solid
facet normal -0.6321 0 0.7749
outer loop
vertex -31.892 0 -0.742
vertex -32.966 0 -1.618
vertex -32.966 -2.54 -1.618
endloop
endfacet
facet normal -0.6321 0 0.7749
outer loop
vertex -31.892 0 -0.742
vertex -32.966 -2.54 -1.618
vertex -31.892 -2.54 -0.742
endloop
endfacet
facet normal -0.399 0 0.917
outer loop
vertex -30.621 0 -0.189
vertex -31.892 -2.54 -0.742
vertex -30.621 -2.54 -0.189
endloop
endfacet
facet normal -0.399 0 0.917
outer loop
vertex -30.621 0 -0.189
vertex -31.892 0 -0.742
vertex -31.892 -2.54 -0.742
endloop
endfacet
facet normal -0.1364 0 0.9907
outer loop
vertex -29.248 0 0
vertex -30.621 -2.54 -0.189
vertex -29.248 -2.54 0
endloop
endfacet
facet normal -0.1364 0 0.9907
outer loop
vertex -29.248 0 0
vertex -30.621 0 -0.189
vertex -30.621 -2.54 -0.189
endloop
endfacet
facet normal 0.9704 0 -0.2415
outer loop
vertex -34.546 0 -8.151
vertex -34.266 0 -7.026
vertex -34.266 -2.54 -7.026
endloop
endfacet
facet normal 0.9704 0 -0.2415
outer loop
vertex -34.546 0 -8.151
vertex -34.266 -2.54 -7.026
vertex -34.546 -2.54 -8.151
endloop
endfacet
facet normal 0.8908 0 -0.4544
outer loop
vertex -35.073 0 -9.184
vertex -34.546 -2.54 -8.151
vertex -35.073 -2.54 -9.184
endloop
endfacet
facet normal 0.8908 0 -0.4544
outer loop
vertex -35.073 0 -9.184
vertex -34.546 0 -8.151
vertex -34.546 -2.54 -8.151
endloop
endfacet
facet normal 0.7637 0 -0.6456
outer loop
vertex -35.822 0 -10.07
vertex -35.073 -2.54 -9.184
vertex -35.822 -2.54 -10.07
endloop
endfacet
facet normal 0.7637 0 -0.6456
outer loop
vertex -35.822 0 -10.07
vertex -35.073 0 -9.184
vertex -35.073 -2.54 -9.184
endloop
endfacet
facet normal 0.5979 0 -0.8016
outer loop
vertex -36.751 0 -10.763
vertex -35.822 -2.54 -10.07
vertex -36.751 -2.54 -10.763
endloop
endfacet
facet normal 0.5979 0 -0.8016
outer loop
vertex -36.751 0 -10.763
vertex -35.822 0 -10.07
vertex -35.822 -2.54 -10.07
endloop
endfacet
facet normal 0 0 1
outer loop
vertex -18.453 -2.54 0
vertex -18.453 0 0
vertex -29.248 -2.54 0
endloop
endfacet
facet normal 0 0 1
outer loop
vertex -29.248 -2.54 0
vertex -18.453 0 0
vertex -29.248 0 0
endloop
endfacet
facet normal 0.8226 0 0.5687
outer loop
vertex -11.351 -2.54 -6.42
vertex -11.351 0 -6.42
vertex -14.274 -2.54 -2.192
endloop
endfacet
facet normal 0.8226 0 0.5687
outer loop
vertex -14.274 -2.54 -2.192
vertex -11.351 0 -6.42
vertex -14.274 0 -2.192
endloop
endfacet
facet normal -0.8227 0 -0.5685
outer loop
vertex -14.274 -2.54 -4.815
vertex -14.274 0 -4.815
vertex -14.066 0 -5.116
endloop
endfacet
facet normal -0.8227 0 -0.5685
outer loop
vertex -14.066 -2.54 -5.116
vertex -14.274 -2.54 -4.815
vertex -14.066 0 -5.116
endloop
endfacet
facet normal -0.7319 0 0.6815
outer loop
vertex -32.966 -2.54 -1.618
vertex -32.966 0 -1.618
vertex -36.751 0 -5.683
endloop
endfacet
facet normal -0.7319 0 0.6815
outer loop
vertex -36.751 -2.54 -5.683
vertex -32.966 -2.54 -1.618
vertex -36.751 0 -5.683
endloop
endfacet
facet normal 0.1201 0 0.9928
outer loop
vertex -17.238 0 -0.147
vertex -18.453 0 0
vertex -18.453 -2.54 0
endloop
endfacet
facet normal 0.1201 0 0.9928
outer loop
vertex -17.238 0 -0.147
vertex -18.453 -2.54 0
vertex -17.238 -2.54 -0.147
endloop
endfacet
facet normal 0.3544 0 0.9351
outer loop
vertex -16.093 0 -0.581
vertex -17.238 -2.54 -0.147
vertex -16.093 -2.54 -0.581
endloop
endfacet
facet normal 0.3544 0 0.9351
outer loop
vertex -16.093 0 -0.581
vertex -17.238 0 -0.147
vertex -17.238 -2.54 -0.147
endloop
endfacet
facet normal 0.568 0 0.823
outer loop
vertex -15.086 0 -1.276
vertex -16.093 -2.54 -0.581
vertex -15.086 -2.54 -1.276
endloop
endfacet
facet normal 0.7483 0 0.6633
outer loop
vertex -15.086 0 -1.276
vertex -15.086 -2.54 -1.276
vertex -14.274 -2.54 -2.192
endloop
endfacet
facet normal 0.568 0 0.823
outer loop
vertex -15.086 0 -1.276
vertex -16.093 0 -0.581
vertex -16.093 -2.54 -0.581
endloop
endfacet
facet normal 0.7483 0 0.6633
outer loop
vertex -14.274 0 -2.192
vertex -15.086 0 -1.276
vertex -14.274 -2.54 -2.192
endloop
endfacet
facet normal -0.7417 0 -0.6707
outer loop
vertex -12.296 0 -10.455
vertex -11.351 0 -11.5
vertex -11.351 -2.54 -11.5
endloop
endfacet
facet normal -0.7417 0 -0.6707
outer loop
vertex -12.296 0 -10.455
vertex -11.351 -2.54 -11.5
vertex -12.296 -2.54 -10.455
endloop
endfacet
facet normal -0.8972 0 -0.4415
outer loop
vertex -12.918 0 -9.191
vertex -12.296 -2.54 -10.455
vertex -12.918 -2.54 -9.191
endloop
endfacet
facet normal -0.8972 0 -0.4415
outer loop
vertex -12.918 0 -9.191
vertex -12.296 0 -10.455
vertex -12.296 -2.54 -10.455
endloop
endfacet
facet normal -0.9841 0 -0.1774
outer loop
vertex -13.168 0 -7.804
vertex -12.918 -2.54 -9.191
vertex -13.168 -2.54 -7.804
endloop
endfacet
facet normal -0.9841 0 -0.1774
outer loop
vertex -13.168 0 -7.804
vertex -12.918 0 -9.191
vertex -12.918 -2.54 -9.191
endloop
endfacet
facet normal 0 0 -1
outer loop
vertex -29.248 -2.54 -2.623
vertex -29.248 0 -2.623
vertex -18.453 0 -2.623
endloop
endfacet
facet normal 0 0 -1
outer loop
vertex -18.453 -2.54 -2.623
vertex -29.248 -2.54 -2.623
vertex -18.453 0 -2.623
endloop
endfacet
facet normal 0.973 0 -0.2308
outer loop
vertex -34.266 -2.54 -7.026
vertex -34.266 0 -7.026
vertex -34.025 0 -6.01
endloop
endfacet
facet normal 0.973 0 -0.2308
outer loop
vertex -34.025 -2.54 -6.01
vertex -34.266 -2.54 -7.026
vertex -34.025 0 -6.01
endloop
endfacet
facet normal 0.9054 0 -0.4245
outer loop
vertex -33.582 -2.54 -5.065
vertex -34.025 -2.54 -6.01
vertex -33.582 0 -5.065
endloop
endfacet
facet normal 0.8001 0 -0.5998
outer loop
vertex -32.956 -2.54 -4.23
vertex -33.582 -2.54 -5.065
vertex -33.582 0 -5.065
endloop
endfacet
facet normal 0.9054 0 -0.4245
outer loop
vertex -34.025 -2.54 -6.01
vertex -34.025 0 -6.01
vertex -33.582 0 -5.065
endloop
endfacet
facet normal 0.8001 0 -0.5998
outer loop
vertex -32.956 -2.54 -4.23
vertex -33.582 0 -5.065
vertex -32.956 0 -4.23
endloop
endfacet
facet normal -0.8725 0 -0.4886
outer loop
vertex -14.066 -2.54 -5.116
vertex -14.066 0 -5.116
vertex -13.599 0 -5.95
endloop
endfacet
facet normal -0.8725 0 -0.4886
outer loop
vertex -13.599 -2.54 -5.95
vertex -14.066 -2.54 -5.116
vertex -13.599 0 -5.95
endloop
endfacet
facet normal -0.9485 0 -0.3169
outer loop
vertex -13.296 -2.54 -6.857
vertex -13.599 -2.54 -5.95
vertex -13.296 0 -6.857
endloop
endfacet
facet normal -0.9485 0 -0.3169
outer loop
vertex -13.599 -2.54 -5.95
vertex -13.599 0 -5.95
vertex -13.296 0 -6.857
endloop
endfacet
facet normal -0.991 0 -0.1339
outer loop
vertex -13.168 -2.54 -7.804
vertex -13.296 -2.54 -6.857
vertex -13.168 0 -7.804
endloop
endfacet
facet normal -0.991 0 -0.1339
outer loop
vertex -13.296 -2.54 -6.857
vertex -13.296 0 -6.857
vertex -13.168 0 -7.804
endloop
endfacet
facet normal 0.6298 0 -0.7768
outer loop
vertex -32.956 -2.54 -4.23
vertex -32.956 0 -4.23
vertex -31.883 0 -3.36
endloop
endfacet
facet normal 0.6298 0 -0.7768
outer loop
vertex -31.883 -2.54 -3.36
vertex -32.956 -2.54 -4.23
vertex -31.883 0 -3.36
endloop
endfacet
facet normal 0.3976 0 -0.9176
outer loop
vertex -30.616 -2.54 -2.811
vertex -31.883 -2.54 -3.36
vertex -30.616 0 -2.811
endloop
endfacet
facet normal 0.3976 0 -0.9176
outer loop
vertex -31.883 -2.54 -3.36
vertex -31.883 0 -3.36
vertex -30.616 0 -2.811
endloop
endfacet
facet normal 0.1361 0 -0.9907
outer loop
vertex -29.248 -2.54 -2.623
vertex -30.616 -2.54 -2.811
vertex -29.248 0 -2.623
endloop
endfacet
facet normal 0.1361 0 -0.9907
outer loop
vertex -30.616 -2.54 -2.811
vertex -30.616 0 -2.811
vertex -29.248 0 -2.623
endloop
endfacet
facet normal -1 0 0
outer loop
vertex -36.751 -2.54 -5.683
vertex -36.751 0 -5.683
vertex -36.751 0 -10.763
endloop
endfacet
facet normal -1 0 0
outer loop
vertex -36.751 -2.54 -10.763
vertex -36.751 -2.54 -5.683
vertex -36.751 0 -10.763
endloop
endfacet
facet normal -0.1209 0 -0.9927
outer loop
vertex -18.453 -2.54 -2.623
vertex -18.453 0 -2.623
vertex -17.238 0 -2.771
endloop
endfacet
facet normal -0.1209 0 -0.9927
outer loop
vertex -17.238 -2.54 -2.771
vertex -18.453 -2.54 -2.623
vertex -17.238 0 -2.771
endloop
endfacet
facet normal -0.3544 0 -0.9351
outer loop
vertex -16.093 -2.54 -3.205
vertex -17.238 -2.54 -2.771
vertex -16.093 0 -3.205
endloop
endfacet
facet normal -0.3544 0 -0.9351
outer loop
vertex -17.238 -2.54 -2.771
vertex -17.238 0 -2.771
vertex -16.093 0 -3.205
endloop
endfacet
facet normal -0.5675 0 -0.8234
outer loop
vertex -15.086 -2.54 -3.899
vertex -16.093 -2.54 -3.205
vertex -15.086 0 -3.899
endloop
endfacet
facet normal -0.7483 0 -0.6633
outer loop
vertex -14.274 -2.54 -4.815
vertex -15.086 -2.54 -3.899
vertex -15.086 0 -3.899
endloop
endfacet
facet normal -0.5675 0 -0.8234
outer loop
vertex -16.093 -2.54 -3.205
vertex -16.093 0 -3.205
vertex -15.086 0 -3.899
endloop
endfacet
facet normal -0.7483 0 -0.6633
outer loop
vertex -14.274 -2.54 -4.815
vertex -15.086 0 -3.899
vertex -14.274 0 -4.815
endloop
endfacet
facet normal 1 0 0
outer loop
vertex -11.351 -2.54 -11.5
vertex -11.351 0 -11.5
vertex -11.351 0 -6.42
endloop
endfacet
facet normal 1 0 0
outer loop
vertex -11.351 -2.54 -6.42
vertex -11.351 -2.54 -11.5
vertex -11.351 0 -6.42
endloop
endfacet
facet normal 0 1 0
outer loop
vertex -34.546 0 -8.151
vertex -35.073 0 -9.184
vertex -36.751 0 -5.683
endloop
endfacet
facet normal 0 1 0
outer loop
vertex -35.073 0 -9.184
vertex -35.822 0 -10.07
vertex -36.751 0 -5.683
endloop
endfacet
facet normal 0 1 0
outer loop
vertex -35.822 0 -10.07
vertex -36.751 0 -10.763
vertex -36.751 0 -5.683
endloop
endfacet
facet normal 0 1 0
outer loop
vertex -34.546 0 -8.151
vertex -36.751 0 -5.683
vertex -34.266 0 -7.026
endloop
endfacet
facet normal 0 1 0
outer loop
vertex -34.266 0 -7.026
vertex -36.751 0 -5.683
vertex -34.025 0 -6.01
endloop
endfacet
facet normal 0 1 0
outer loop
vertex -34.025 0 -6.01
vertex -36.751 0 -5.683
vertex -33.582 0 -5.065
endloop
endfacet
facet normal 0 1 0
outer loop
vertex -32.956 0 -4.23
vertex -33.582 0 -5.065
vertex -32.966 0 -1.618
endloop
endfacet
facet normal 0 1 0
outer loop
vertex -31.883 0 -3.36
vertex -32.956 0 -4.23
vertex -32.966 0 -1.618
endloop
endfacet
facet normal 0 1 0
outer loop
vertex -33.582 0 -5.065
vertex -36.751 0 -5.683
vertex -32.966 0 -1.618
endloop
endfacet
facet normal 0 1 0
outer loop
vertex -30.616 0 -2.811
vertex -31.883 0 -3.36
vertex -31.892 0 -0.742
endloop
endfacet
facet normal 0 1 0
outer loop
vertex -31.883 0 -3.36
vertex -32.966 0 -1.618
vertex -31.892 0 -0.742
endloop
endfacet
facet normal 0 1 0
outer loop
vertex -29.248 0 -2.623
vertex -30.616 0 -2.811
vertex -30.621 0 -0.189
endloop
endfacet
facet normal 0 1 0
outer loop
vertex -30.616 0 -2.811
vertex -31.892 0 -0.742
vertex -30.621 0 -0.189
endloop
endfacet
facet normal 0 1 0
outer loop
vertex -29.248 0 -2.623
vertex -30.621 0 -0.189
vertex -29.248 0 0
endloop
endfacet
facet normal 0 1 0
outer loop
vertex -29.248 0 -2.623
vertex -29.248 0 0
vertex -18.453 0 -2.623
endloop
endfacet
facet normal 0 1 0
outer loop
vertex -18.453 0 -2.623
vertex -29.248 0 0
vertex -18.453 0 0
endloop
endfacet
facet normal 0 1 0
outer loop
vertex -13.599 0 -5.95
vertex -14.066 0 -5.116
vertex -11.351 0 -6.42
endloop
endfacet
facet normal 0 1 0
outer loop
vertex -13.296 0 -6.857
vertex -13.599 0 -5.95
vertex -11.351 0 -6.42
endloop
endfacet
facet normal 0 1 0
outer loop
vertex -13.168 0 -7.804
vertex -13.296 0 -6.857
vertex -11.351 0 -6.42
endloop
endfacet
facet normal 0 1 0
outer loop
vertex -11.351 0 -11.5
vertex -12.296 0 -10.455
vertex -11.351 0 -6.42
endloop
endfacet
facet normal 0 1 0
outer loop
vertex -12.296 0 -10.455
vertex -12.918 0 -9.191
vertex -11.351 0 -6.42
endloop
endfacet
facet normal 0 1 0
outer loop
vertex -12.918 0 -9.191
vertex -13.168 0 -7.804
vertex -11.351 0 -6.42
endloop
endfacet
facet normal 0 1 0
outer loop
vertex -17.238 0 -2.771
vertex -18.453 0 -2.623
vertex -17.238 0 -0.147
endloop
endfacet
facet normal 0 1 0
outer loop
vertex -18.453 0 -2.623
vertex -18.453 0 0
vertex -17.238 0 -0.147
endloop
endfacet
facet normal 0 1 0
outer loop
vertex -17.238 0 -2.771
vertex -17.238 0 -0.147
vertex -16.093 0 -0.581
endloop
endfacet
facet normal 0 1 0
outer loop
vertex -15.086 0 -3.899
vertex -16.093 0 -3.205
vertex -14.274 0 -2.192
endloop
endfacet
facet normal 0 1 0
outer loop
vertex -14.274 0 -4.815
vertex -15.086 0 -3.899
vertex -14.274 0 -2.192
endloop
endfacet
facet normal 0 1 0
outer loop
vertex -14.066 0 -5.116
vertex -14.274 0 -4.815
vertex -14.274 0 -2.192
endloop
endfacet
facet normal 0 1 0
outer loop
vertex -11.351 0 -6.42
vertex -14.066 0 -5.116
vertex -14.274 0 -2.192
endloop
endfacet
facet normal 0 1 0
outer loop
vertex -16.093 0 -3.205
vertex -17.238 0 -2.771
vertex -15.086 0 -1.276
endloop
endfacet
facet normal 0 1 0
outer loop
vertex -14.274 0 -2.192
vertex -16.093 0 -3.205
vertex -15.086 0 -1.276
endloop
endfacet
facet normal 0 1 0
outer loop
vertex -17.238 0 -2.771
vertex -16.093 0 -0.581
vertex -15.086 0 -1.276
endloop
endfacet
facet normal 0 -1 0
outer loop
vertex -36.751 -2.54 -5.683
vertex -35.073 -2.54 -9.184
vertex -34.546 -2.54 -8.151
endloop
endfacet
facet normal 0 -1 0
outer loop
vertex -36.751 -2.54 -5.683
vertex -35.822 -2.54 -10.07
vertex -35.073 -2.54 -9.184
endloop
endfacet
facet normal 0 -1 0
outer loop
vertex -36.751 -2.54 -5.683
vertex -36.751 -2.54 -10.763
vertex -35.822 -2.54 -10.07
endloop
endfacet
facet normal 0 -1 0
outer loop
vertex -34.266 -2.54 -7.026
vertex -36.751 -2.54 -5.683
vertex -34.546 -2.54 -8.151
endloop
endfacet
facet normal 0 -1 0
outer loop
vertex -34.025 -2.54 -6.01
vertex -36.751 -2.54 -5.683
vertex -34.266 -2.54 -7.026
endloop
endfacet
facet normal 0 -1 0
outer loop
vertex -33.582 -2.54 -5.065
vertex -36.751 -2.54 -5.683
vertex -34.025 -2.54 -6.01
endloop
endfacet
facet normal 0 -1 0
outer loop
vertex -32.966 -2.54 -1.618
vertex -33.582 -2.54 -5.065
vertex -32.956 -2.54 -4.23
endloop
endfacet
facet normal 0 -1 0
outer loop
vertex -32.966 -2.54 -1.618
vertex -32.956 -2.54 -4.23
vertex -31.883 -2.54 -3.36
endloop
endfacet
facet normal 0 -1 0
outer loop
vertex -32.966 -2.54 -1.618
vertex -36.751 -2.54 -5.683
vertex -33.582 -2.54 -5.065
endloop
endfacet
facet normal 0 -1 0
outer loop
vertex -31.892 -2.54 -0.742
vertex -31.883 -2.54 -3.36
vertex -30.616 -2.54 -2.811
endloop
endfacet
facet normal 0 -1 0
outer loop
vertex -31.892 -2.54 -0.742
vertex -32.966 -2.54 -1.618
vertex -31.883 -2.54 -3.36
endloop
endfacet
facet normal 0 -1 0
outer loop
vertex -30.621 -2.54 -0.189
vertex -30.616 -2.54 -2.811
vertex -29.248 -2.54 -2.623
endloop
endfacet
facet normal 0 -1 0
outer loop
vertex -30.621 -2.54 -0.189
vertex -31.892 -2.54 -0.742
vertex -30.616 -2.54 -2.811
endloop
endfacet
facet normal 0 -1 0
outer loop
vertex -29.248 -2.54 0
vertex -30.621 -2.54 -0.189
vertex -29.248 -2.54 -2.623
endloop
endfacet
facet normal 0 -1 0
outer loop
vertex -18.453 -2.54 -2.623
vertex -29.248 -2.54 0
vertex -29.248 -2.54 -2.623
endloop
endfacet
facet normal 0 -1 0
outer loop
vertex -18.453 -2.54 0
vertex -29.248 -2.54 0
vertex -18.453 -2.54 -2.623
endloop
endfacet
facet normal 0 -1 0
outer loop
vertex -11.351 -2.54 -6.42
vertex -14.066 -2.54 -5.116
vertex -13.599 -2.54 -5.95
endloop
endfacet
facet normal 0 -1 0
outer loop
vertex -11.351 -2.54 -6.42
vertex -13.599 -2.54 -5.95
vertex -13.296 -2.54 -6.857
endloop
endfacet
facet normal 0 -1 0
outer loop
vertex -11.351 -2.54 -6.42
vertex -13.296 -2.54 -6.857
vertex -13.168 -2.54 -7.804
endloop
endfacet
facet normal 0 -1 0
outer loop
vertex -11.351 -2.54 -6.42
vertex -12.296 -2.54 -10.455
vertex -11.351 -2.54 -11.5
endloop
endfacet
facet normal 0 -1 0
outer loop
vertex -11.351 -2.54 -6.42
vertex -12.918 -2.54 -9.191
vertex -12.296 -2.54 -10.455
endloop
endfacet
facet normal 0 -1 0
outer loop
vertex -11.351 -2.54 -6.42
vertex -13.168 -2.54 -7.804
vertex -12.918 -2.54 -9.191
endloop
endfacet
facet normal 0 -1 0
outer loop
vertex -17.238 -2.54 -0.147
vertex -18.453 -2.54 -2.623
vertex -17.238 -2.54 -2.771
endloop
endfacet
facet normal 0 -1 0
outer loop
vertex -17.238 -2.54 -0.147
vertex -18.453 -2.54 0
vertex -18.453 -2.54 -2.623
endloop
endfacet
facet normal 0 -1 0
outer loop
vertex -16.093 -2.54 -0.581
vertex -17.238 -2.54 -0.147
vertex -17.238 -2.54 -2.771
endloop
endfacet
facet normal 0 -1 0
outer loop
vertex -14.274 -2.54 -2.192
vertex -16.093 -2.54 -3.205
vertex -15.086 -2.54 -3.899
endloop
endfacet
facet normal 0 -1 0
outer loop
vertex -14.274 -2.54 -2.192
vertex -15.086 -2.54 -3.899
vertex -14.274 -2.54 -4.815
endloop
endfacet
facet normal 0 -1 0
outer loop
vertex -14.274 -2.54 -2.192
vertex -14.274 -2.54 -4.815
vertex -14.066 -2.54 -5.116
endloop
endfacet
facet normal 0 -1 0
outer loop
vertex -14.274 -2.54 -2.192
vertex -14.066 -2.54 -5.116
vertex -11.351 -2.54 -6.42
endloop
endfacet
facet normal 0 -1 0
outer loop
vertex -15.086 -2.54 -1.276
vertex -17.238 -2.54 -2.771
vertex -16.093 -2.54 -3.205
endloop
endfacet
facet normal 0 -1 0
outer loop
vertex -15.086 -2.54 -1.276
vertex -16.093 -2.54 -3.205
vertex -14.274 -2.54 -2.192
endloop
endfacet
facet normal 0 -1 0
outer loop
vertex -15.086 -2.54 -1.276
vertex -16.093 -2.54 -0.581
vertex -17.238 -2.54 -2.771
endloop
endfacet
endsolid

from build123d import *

# Parameters (mm, degrees)
F1_DEPTH    = 2.54
F2_T1_DEPTH = 2.54
F2_T3_DEPTH = 13.5939610314
F2_T5_DEPTH = 15.8607267087
F3_T1_DEPTH = 21.0206169328
F3_T3_DEPTH = 21.2247608177


# Not quite as in the source:
# - a fillet or chamfer that OpenCascade refuses, or shapes differently, is made with other operations: its cross-section is extruded or revolved along the edge and cut away or added


with BuildPart() as f1:
    # F0 (on Front) → F1 (new body)
    with BuildSketch(Plane.XZ):
        Polygon((-31.4589329064, 0), (-36.7512629041, -5.6826620174), (-36.7512629041, -10.7626620174), (-34.308064729, -10.7626620174), (-34.308064729, -5.6826620174), (-31.4589329064, -2.6233945118), (-15.7887097448, -2.6233945118), (-13.1645070408, -6.4200807009), (-13.1645070408, -11.5000807009), (-11.3512629041, -11.5000807009), (-11.3512629041, -6.4200807009), (-15.7887097448, 0), align=None)
    extrude(amount=F1_DEPTH)

    # F2: fillet of radius 5.08 on 6 edges, made by hand

    # F2_s2 → F2_t1 (join)
    with BuildSketch(Plane.XZ):
        with BuildLine():
            ThreePointArc((-32.9656479615, -4.2412362599), (-31.2752859934, -3.0453818498), (-29.2481407001, -2.6233945118))
            Line((-29.2481407001, -2.6233945118), (-31.4589329064, -2.6233945118))
            Line((-31.4589329064, -2.6233945118), (-32.9656479615, -4.2412362599))
        make_face()
        with BuildLine():
            ThreePointArc((-18.4528550865, -2.6233945118), (-16.0934809554, -3.2045331326), (-14.2739191976, -4.8149875397))
            Line((-14.2739191976, -4.8149875397), (-15.7887097448, -2.6233945118))
            Line((-15.7887097448, -2.6233945118), (-18.4528550865, -2.6233945118))
        make_face()
        with BuildLine():
            ThreePointArc((-14.0655711519, -5.1164246759), (-13.3950022045, -6.4919857066), (-13.1645070408, -8.0048316479))
            Line((-13.1645070408, -8.0048316479), (-13.1645070408, -6.4200807009))
            Line((-13.1645070408, -6.4200807009), (-14.0655711519, -5.1164246759))
        make_face()
        with BuildLine():
            ThreePointArc((-34.308064729, -7.6818378518), (-33.9551852525, -5.8215336949), (-32.9455719904, -4.2196795999))
            Line((-32.9455719904, -4.2196795999), (-34.308064729, -5.6826620174))
            Line((-34.308064729, -5.6826620174), (-34.308064729, -7.6818378518))
        make_face()
    extrude(amount=F2_T1_DEPTH)

    # F2_s4 → F2_t3 (cut)
    with BuildSketch(Plane.XZ.offset(-5.5269805157)):
        with BuildLine():
            ThreePointArc((-32.9656479615, -1.6178417481), (-31.2752859934, -0.421987338), (-29.2481407001, 0))
            Line((-29.2481407001, 0), (-31.4589329064, 0))
            Line((-31.4589329064, 0), (-32.9656479615, -1.6178417481))
        make_face()
    extrude(amount=F2_T3_DEPTH, mode=Mode.SUBTRACT)

    # F2_s6 → F2_t5 (cut)
    with BuildSketch(Plane.XZ.offset(-6.6603633543)):
        with BuildLine():
            ThreePointArc((-18.4528550865, 0), (-16.0934809554, -0.5811386208), (-14.2739191976, -2.1915930279))
            Line((-14.2739191976, -2.1915930279), (-15.7887097448, 0))
            Line((-15.7887097448, 0), (-18.4528550865, 0))
        make_face()
    extrude(amount=F2_T5_DEPTH, mode=Mode.SUBTRACT)

    # F3: fillet of radius 5.08 on 2 edges, made by hand

    # F3_s2 → F3_t1 (cut)
    with BuildSketch(Plane.XZ.offset(-9.2403084664)):
        with BuildLine():
            ThreePointArc((-11.3512629041, -11.5000807009), (-12.6512581821, -9.8444473796), (-13.1684800157, -7.8039594497))
            Line((-13.1684800157, -7.8039594497), (-13.6760827182, -7.8240466695))
            ThreePointArc((-13.6760827182, -7.8240466695), (-13.6725070408, -8.0048316479), (-13.6725070408, -11.5000807009))
            Line((-13.6725070408, -11.5000807009), (-13.1645070408, -12.0080807009))
            ThreePointArc((-13.1645070408, -12.0080807009), (-12.2578849724, -12.0080807009), (-11.6771438954, -11.8897800459))
            Line((-11.6771438954, -11.8897800459), (-11.3512629041, -11.5000807009))
        make_face()
    extrude(amount=F3_T1_DEPTH, mode=Mode.SUBTRACT)

    # F3_s4 → F3_t3 (cut)
    with BuildSketch(Plane.XZ.offset(-9.3423804089)):
        with BuildLine():
            ThreePointArc((-34.2655455901, -7.0259517536), (-35.0733800628, -9.183691684), (-36.7512629041, -10.7626620174))
            Line((-36.7512629041, -10.7626620174), (-36.4960865494, -11.2019216536))
            ThreePointArc((-36.4960865494, -11.2019216536), (-35.5296638165, -11.2706620174), (-34.308064729, -11.2706620174))
            Line((-34.308064729, -11.2706620174), (-33.800064729, -10.7626620174))
            ThreePointArc((-33.800064729, -10.7626620174), (-33.800064729, -7.6818378518), (-33.761797504, -7.0915403635))
            Line((-33.761797504, -7.0915403635), (-34.2655455901, -7.0259517536))
        make_face()
    extrude(amount=F3_T3_DEPTH, mode=Mode.SUBTRACT)


solid = f1.part
